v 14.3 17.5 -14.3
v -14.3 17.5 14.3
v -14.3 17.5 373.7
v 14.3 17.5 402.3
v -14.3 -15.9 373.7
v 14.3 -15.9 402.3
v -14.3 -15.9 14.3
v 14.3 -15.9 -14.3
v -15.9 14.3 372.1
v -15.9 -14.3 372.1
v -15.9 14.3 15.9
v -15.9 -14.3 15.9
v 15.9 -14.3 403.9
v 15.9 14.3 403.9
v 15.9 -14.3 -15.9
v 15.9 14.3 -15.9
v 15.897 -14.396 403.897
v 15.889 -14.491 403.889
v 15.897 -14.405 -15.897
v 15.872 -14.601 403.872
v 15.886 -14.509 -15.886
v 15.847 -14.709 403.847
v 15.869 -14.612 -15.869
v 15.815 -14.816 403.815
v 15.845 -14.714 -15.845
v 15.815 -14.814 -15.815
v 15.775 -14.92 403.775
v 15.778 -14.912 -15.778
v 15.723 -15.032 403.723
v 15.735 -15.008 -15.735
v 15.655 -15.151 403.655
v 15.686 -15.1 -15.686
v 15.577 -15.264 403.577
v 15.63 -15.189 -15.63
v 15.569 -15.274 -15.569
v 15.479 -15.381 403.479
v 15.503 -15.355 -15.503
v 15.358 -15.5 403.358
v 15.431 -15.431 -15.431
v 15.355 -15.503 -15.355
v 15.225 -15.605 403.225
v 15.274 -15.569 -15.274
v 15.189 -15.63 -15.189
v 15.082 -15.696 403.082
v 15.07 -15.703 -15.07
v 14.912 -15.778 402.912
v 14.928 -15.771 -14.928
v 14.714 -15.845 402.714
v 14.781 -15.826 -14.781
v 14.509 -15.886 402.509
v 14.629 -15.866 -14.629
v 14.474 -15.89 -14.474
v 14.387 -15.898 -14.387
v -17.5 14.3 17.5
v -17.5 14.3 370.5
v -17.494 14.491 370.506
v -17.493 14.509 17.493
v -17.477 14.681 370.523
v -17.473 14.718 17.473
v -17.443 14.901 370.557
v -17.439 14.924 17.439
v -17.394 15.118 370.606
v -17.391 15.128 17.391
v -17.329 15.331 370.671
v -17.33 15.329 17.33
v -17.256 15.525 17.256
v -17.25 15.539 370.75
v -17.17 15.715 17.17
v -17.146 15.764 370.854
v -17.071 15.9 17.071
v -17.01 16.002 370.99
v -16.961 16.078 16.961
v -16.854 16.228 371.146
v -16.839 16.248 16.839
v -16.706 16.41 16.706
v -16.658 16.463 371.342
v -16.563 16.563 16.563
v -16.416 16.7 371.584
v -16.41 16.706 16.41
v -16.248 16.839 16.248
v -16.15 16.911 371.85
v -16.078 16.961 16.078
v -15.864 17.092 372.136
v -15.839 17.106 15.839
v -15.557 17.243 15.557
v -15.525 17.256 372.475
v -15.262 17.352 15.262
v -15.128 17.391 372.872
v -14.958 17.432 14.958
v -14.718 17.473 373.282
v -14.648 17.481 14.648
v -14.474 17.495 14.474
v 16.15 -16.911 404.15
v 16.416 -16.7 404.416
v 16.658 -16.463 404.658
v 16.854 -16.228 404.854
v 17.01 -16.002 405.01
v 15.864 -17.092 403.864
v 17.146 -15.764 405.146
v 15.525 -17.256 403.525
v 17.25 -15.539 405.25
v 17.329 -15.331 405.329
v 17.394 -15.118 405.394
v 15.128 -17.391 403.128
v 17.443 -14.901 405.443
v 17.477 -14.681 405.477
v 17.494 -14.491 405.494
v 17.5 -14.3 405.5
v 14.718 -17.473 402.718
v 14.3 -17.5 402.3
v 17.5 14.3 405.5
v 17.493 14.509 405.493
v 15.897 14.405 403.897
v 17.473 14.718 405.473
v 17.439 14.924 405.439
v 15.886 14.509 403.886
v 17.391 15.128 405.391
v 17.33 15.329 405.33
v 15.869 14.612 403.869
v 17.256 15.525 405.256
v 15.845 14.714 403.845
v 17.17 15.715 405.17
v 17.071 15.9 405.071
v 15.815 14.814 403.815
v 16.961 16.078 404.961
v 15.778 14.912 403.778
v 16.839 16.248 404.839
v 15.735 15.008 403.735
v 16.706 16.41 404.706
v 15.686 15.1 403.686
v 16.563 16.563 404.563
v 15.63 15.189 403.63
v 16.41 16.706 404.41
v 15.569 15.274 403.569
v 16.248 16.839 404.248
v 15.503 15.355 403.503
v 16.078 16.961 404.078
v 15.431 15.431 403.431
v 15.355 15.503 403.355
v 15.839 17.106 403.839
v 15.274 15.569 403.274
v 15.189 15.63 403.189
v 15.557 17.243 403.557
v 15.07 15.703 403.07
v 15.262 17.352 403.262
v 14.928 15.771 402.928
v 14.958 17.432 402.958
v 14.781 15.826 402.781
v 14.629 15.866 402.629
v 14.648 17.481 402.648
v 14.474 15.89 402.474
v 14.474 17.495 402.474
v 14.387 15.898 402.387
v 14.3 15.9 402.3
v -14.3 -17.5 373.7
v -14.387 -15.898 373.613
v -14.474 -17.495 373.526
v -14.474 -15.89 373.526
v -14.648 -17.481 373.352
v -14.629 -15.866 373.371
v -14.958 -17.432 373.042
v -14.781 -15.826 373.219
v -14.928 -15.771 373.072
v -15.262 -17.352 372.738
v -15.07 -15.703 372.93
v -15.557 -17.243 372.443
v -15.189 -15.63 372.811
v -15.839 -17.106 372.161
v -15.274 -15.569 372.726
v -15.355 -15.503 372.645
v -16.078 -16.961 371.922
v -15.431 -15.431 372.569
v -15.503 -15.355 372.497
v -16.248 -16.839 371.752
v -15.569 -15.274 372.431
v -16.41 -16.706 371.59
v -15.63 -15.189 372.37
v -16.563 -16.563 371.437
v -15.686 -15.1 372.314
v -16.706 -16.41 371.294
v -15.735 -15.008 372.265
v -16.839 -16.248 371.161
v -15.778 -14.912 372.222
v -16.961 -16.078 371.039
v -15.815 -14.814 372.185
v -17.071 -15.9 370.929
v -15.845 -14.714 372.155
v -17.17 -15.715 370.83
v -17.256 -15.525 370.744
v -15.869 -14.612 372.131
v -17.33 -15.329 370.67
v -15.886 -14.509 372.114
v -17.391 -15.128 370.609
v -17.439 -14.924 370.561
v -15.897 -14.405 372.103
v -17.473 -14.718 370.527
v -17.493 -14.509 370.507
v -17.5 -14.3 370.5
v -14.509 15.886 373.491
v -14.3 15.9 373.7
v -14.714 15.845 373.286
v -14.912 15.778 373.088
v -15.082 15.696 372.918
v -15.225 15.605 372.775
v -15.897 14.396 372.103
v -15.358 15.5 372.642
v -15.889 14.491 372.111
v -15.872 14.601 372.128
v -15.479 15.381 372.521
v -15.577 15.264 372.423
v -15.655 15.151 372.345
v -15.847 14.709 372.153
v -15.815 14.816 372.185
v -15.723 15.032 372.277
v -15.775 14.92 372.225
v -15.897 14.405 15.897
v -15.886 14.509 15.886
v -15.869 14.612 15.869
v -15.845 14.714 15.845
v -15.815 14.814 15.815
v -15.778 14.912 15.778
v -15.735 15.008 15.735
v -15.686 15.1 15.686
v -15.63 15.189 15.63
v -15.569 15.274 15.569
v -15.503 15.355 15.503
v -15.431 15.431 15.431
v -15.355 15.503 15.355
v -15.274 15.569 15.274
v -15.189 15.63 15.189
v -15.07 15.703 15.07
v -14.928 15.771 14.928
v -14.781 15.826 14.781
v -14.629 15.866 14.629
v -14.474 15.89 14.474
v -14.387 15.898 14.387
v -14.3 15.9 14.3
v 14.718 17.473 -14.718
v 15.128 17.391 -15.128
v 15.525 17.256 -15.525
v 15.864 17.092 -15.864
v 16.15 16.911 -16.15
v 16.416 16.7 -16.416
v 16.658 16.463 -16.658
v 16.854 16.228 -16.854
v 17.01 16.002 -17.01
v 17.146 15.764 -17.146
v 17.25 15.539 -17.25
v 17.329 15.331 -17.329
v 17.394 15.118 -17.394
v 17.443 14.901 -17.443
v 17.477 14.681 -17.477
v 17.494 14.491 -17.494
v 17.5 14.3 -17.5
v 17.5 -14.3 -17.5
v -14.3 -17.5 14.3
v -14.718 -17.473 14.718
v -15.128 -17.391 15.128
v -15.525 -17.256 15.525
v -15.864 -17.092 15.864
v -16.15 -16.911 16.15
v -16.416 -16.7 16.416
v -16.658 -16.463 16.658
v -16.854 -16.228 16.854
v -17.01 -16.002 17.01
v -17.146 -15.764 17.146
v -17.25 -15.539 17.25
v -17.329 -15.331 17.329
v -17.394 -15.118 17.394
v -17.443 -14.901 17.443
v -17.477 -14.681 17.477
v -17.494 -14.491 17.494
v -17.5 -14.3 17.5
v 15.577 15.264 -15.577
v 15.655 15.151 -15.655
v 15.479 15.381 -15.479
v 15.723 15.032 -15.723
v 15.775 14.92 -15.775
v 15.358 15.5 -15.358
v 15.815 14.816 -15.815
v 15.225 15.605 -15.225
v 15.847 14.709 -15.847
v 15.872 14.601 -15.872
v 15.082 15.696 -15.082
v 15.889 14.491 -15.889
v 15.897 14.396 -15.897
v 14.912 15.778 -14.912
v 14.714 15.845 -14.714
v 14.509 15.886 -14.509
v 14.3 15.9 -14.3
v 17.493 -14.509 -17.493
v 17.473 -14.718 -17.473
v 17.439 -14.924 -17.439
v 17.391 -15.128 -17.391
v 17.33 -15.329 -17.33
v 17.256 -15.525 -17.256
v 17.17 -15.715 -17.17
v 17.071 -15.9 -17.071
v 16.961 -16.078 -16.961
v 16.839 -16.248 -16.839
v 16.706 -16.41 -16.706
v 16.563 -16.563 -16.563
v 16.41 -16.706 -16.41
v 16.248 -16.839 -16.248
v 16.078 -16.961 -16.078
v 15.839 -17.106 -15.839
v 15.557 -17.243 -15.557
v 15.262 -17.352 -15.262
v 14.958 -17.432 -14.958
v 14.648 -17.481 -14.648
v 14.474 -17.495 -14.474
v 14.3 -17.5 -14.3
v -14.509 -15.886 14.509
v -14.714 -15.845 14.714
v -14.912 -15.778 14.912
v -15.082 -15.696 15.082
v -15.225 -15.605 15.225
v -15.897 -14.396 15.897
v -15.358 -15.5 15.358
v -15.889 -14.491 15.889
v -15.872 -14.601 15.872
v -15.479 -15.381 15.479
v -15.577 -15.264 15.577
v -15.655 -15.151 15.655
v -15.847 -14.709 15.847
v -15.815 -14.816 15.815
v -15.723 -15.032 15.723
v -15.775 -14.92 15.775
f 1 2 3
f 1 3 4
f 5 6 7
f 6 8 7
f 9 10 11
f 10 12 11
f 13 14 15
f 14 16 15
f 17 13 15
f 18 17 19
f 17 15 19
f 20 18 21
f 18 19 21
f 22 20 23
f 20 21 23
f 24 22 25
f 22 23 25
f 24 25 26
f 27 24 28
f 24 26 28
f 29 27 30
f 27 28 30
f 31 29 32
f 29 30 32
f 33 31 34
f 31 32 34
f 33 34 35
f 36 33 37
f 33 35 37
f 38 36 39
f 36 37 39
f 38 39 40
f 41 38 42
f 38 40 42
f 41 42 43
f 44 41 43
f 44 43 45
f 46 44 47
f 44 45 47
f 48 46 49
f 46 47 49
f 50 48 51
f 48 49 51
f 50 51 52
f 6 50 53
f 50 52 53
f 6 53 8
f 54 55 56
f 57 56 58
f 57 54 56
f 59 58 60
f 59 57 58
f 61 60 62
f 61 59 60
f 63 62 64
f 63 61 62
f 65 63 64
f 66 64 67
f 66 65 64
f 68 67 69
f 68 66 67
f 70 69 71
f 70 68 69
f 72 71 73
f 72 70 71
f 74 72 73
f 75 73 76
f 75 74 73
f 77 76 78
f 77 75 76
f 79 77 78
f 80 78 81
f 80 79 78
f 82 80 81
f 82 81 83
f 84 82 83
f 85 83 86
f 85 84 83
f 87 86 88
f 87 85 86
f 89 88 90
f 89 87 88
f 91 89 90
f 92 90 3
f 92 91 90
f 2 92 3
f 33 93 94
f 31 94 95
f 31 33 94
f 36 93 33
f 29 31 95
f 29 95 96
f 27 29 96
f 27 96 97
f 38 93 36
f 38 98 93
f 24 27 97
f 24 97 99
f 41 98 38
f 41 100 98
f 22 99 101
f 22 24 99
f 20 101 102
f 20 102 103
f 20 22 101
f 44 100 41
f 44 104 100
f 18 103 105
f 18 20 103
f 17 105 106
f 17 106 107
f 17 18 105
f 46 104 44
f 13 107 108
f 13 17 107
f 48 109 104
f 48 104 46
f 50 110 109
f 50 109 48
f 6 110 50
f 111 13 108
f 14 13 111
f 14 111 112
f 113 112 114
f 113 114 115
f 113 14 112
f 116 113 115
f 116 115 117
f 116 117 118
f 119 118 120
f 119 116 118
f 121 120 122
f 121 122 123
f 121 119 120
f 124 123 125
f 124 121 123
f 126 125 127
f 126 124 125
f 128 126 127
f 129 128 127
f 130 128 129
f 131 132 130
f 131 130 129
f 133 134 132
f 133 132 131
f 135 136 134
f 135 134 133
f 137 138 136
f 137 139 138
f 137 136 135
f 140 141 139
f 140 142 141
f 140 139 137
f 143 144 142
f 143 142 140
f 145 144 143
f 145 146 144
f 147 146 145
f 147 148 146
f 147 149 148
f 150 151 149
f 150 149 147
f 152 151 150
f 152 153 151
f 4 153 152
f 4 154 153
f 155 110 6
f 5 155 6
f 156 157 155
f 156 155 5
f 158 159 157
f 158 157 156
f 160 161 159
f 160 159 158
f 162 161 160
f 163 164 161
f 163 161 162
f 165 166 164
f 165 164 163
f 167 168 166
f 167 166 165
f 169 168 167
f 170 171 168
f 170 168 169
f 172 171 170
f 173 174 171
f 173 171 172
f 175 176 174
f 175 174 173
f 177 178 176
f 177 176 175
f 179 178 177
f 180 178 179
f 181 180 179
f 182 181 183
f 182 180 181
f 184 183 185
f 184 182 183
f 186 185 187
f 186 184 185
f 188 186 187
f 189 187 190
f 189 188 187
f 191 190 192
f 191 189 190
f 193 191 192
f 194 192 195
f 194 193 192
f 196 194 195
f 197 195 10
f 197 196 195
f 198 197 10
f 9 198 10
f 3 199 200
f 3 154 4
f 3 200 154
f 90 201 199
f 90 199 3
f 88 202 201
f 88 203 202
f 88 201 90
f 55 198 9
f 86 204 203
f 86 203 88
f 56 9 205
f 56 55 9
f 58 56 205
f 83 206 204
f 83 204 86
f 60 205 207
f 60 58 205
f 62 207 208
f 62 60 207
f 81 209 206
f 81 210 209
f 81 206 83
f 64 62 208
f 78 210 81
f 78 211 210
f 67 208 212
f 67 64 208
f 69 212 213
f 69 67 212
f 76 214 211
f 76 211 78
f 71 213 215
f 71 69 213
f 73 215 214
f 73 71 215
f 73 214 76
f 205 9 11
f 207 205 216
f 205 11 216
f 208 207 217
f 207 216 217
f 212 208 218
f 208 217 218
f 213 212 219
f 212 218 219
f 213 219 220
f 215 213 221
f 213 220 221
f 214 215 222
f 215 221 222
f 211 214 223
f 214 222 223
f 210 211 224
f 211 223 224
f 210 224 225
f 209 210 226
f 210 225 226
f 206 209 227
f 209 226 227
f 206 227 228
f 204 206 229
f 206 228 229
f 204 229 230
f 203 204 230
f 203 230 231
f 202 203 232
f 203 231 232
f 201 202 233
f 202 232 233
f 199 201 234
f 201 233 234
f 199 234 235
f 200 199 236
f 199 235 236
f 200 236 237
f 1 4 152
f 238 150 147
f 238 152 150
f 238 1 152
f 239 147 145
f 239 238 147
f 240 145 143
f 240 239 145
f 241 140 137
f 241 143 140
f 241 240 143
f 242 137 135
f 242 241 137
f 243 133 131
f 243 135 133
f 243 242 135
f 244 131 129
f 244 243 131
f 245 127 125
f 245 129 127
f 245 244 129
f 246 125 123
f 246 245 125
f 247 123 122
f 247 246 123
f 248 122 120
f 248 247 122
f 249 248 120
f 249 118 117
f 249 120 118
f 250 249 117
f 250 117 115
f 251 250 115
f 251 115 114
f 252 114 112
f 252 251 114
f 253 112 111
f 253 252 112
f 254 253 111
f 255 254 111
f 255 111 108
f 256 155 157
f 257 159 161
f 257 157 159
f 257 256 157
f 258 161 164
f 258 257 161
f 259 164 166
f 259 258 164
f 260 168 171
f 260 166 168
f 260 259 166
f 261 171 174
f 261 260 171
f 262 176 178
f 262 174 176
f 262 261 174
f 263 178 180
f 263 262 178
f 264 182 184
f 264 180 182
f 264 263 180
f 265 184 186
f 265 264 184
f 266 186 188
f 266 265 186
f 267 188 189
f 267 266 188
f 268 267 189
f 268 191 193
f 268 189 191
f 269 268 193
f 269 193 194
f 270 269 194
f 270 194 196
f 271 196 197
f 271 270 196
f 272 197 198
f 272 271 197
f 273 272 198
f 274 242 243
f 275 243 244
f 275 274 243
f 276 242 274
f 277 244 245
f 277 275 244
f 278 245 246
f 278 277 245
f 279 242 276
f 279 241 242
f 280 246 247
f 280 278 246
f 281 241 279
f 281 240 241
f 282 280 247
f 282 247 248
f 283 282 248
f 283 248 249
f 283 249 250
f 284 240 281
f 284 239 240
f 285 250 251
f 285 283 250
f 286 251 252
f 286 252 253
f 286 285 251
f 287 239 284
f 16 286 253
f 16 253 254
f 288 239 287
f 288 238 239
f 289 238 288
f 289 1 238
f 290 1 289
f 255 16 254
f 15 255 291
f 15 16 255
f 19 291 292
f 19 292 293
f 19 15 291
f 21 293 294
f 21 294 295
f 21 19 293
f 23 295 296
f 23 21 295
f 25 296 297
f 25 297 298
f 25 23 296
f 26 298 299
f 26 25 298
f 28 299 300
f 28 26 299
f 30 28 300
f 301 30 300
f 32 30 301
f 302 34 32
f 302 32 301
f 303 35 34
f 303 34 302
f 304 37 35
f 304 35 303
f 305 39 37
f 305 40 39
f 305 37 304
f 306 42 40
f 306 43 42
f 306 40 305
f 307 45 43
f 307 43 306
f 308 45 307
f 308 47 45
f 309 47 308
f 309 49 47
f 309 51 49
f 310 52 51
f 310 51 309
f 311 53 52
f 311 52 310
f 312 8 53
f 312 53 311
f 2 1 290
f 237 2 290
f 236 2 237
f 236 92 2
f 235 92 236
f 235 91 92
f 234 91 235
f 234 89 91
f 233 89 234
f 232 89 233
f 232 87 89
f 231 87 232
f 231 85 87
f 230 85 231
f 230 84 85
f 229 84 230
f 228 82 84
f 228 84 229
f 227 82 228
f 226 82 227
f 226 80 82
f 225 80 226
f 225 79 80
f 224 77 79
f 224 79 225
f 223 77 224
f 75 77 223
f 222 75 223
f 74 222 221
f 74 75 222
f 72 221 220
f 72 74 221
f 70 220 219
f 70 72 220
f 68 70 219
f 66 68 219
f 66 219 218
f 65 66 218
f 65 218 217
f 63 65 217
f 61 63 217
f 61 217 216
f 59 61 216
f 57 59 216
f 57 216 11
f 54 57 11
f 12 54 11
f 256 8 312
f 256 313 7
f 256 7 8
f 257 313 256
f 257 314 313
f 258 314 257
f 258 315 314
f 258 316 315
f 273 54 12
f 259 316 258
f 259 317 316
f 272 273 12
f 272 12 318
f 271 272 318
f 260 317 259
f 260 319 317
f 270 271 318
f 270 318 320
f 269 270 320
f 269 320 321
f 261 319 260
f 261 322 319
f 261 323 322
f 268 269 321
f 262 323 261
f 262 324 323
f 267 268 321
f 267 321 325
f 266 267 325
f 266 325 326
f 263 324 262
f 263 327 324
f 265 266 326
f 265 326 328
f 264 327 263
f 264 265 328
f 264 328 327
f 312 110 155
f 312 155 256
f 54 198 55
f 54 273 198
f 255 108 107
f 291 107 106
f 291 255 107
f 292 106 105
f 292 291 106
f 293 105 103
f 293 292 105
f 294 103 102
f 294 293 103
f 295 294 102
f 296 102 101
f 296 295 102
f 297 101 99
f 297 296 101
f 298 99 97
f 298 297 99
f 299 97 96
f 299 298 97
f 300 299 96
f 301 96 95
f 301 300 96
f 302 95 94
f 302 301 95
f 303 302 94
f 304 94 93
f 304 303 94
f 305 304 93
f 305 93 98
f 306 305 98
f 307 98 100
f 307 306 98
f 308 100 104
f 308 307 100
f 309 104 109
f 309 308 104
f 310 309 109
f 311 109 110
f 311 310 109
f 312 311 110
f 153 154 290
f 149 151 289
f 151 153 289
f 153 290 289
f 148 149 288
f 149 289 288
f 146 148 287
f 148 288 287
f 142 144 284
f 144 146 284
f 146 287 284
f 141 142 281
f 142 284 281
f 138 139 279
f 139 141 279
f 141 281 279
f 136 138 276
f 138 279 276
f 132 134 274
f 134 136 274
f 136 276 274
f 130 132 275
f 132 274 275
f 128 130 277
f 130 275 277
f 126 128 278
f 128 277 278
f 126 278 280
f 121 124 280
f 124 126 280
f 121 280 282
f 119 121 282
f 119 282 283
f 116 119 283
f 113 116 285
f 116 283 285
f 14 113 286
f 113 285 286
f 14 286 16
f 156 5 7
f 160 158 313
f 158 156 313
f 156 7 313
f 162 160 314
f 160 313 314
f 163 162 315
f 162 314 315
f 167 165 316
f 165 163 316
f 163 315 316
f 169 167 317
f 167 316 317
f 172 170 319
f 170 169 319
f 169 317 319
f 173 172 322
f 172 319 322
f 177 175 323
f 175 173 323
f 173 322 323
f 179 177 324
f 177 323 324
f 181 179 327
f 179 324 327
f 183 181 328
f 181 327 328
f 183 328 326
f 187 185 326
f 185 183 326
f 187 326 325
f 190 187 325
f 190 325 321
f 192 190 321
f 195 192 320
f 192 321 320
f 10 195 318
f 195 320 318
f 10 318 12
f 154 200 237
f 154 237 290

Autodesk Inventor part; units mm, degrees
ref_plane "Start plane" through (0, 0, -17.5) normal (0, 0, 1) x (1, 0, 0)
ref_plane "End plane" through (0, 0, 405.5) normal (0, 0, 1) x (1, 0, 0)
sketch "Sketch" plane through (0, 0, 0) normal (0, 0, 1) x (1, 0, 0)
  line L0 (-17.5, -14.3) -> (-17.5, 14.3)
  line L1 (-14.3, 17.5) -> (14.3, 17.5)
  line L2 (17.5, 14.3) -> (17.5, -14.3)
  line L3 (14.3, -17.5) -> (-14.3, -17.5)
  arc A0 (-17.5, -14.3) -> (-14.3, -17.5) centre (-14.3, -14.3) ccw
  arc A1 (-14.3, 17.5) -> (-17.5, 14.3) centre (-14.3, 14.3) ccw
  arc A2 (17.5, 14.3) -> (14.3, 17.5) centre (14.3, 14.3) ccw
  arc A3 (14.3, -17.5) -> (17.5, -14.3) centre (14.3, -14.3) ccw
  arc A4 (-14.3, 15.9) -> (-15.9, 14.3) centre (-14.3, 14.3) ccw
  line L4 (-14.3, 15.9) -> (14.3, 15.9)
  arc A5 (15.9, 14.3) -> (14.3, 15.9) centre (14.3, 14.3) ccw
  line L5 (15.9, 14.3) -> (15.9, -14.3)
  arc A6 (14.3, -15.9) -> (15.9, -14.3) centre (14.3, -14.3) ccw
  line L6 (14.3, -15.9) -> (-14.3, -15.9)
  arc A7 (-15.9, -14.3) -> (-14.3, -15.9) centre (-14.3, -14.3) ccw
  line L7 (-15.9, -14.3) -> (-15.9, 14.3)
  line L8 (0, 25.4278) -> (0, -25.4278) construction
  line L9 (-25.4278, 0) -> (25.4278, 0) construction
  dimension "d7" = 3.2
  dimension "d10" = 35
  dimension "d11" = 35
  dimension "d12" = 1.6
  dimension "d15" = 17.5
  dimension "d16" = 17.5
extrude "Body" add sketch "Sketch" along normal up to surface (423 mm away) from surface at -17.5
sketch "Sketch3" plane through (0, 0, 0) normal (0, 0, 1) x (1, 0, 0)
  line L0 (0, 0) -> (10, 0)
ref_plane "Work Plane3" through (0, 0, 0) normal (0, -1, 0) x (1, 0, 0)
sketch "Sketch4" plane through (0, 0, 0) normal (0, -1, 0) x (1, 0, 0)
  line L0 (-2, -17.5) -> (12, -17.5)
  line L1 (-2, 405.5) -> (12, 405.5)
  dimension "d18" = 423
ref_plane "Work Plane11" through (-8.5964, 0, 403.2431) normal (-0.4912, 0, 0.871) x (0.871, 0, 0.4912)
split "Split5" plane through (-8.5964, 0, 403.2431) removes the side toward (-0.4912, 0, 0.871)
ref_plane "Work Plane12" through (-696.5964, 0, 372.7569) normal (-0.4912, 0, -0.871) x (-0.871, 0, 0.4912)
split "Split6" plane through (-696.5964, 0, 372.7569) removes the side toward (-0.4912, 0, -0.871)
ref_plane "Work Plane13" through (17.5, 0, 405.5) normal (-0.7071, 0, 0.7071) x (0.7071, 0, 0.7071)
split "Split7" plane through (17.5, 0, 405.5) removes the side toward (-0.7071, 0, 0.7071)
ref_plane "Work Plane14" through (17.5, 0, -17.5) normal (-0.7071, 0, -0.7071) x (-0.7071, 0, 0.7071)
split "Split8" plane through (17.5, 0, -17.5) removes the side toward (-0.7071, 0, -0.7071)
equation "\"d7\" = G_IR"
equation "\"d10\" = G_H"
equation "\"d11\" = G_W"
equation "\"d12\" = G_T"
equation "\"d15\" = 0.5 * d10"
equation "\"d16\" = 0.5 * d11"
equation "\"d3\" = G_L"
equation "\"G_W\" = 35"
equation "\"G_H\" = 35"
equation "\"G_T\" = 1.6"
equation "\"G_IR\" = 3.2"
equation "\"G_L\" = d18"
equation "\"G_OFFSET_START\" = 17.5"
equation "\"G_OFFSET_END\" = 17.5"
equation "\"d13\" = -G_OFFSET_START"
equation "\"d14\" = G_OFFSET_END + B_L"
equation "\"B_L\" = 388"
properties part number "AS 1163 - C350L0 35x35x1.6 SHS - 423" material "Steel, Mild"
